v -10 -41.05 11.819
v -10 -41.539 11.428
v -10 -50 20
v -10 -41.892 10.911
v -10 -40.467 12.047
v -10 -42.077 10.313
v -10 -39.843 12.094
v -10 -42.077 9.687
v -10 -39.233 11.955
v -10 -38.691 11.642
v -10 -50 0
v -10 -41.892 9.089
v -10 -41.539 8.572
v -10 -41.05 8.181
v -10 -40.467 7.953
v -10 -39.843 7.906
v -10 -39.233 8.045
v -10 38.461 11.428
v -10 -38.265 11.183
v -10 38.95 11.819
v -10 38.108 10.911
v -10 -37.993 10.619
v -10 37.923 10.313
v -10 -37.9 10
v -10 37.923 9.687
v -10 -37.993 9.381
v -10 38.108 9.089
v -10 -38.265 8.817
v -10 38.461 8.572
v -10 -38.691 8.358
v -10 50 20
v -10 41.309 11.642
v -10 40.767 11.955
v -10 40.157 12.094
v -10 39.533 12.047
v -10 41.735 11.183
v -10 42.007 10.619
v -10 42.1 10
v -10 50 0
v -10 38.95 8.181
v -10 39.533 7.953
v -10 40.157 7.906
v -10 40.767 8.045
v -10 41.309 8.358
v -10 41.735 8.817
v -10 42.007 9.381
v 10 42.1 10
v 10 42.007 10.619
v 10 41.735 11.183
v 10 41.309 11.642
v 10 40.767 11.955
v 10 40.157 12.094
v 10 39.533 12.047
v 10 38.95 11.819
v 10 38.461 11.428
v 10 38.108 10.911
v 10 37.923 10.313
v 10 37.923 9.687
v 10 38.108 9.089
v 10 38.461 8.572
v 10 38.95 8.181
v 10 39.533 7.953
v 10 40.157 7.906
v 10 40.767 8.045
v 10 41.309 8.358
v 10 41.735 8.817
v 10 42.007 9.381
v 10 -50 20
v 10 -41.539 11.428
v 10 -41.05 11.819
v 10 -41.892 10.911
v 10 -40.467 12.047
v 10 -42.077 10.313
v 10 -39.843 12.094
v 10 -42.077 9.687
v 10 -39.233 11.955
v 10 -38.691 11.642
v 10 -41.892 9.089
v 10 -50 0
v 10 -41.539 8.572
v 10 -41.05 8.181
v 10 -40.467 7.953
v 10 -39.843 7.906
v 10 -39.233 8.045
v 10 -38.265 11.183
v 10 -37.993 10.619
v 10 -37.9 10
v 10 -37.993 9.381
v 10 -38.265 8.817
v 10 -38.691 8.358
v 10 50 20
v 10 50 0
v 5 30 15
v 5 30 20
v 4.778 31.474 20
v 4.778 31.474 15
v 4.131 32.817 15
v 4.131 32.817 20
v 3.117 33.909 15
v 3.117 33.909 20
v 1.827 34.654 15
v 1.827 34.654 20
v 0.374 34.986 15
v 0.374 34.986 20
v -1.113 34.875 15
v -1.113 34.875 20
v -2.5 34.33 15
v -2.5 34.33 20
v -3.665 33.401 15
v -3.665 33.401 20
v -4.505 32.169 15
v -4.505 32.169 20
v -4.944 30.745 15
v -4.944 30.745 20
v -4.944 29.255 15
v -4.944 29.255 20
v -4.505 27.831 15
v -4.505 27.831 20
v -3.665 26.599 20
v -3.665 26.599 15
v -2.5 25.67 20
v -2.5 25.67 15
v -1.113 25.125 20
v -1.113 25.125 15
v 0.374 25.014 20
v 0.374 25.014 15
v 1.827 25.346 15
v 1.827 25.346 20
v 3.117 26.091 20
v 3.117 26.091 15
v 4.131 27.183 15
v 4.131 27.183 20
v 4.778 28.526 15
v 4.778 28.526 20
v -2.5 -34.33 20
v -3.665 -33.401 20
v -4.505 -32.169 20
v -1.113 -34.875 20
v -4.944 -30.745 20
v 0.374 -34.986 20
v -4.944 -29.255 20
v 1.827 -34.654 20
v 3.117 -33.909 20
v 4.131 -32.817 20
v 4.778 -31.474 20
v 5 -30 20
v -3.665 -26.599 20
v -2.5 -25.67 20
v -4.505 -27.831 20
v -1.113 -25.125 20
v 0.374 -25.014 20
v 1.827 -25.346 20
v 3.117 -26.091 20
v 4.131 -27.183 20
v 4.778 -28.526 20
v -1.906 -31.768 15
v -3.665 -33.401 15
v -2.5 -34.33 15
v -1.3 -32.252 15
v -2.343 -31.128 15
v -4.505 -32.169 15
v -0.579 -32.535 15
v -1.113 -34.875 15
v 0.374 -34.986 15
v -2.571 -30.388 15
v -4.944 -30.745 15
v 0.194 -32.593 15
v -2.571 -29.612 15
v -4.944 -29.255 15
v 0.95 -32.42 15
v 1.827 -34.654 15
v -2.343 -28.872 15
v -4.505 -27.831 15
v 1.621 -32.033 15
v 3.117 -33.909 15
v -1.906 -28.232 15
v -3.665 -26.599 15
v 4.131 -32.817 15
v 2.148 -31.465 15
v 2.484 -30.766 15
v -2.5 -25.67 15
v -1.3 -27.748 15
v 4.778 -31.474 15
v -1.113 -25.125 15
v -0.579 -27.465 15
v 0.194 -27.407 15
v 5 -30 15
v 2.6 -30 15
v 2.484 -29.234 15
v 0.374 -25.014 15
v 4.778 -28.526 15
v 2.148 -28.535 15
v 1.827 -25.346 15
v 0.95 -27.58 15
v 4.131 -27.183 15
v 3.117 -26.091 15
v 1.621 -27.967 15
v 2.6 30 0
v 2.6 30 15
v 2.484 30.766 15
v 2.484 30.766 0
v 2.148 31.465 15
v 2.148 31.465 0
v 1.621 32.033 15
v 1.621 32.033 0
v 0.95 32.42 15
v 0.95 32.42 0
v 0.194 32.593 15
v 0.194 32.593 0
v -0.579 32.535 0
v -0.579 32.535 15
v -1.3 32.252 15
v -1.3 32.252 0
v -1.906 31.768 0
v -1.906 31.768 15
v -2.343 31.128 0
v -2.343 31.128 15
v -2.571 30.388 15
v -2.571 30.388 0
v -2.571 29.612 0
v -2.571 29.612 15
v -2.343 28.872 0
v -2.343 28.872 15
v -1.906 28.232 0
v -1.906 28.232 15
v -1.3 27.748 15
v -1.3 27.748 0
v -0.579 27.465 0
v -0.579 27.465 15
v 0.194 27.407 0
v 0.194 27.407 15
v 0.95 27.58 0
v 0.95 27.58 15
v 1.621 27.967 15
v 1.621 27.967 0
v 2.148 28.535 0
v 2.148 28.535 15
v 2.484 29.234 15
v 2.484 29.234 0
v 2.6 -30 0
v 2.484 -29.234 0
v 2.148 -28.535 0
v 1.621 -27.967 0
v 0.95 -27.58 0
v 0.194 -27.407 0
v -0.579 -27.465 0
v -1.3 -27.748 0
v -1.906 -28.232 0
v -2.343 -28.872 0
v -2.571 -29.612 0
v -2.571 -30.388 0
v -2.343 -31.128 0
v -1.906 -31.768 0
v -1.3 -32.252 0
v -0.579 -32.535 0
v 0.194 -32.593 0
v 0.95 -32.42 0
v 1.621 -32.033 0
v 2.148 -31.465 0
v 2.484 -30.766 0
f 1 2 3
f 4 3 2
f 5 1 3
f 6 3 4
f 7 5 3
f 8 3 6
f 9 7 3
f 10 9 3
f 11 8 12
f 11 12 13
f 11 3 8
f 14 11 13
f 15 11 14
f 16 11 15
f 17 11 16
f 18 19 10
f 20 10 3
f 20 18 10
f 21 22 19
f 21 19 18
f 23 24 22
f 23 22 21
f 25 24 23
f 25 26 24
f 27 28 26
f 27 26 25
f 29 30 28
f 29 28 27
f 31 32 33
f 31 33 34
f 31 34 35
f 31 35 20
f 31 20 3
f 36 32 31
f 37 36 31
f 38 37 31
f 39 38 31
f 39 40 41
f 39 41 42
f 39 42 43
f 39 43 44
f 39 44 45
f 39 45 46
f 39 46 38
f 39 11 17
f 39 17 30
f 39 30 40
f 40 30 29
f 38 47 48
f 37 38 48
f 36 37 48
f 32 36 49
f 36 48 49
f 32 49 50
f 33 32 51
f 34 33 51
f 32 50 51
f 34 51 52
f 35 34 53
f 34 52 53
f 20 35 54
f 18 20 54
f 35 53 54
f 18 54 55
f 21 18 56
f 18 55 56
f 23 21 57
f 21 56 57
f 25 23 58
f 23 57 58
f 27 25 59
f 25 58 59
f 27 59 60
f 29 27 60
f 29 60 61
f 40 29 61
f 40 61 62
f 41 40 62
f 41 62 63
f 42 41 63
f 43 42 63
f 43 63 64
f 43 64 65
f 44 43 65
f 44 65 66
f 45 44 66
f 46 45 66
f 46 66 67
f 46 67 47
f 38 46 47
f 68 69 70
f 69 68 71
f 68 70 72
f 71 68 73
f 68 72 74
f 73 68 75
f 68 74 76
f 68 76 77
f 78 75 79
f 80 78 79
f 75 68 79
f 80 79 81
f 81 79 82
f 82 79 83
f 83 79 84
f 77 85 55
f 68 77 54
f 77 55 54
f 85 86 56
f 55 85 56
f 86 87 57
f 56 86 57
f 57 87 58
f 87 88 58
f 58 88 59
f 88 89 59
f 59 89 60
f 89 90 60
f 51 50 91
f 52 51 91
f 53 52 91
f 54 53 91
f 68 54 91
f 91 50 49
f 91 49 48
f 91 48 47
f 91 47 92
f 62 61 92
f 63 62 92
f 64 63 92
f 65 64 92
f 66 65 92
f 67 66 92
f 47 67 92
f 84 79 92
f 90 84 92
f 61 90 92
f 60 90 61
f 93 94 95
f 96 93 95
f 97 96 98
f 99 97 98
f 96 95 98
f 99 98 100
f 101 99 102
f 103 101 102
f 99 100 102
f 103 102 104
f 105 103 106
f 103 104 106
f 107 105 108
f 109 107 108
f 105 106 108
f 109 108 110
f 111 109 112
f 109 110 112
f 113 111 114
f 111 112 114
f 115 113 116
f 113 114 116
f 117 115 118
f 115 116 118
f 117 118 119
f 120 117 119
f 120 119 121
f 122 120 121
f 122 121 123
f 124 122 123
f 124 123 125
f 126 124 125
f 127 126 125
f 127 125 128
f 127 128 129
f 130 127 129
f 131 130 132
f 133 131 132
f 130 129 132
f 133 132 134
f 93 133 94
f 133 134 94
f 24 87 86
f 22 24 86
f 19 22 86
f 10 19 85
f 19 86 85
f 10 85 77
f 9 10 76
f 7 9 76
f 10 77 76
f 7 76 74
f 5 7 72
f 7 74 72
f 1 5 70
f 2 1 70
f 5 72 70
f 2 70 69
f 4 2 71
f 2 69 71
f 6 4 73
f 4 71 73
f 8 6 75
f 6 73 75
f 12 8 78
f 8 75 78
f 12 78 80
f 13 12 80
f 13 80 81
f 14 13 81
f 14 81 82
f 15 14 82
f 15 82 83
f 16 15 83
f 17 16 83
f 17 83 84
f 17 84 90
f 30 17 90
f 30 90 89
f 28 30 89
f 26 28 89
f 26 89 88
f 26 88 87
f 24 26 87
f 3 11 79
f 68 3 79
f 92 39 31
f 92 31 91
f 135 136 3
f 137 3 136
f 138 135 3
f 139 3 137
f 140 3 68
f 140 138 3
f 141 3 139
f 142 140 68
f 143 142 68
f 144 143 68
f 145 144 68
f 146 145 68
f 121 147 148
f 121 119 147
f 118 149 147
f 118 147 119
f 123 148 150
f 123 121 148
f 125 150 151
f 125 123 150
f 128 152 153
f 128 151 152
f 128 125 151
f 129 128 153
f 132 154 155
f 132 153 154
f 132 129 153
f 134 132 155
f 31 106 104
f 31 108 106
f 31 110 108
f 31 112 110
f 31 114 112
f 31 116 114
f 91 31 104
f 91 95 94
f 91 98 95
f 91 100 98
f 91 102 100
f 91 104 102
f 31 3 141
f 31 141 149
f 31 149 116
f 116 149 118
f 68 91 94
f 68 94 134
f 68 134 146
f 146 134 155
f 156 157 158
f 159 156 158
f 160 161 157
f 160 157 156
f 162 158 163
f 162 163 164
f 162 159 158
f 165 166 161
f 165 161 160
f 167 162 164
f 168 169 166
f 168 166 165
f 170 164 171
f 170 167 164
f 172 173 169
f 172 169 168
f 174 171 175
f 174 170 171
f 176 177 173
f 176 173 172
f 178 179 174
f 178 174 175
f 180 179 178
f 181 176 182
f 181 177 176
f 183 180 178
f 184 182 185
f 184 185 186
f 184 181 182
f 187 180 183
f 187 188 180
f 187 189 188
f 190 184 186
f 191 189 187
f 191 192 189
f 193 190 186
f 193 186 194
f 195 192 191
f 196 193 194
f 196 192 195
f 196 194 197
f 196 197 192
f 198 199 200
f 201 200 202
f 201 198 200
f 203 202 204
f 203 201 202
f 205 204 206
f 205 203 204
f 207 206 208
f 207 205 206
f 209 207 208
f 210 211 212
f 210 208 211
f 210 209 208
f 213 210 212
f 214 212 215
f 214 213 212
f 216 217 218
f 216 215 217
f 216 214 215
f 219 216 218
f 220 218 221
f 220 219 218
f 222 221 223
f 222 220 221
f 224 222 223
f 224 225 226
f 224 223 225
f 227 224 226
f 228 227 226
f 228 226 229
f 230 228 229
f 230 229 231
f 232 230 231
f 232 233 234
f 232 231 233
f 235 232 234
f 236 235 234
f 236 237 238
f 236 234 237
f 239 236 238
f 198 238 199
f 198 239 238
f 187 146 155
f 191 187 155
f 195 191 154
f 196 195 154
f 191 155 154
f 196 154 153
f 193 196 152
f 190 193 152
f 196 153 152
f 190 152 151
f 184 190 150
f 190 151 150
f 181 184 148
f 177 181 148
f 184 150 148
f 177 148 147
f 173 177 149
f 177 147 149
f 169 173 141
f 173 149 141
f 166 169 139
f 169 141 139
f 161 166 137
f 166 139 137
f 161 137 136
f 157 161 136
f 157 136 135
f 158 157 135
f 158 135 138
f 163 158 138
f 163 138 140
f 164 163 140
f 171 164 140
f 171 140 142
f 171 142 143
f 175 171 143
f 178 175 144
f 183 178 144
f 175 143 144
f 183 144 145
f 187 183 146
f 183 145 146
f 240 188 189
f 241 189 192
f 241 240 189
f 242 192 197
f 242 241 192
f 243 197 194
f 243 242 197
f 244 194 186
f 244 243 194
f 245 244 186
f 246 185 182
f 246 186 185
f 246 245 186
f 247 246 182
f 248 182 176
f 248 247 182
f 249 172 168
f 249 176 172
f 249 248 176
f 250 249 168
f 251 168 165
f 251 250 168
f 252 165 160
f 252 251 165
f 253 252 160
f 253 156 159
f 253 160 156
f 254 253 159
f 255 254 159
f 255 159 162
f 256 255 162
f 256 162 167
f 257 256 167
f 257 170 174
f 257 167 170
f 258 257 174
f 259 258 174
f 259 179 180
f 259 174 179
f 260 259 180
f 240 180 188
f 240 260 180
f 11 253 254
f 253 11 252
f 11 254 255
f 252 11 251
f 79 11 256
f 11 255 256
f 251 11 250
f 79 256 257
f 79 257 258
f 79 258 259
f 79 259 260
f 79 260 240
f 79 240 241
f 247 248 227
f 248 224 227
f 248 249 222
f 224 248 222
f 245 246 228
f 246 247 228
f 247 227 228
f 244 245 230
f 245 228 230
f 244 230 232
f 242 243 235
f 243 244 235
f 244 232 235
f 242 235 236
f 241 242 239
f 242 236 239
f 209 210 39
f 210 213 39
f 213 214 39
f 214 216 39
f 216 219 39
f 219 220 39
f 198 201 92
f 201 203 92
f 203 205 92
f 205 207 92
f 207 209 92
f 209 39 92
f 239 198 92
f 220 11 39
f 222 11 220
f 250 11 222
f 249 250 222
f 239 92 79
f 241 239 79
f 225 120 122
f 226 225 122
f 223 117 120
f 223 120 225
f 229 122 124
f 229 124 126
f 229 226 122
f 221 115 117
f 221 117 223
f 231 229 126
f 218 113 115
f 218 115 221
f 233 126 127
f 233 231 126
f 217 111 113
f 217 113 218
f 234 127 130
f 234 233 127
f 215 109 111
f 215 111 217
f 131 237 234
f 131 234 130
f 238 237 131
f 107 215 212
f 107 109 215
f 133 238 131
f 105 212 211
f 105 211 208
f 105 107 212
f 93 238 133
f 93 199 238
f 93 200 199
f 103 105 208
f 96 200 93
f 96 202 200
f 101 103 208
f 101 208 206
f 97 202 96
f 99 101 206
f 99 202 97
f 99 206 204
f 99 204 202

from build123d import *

# Parameters (mm, degrees)
F0_W     = 20
F0_H     = 100
F0_R     = 2.6
F1_DEPTH = 20
F2_R     = 5
F3_DEPTH = 5
F4_R     = 2.1
F5_DEPTH = 25


with BuildPart() as f1:
    # F0 (on Top) → F1 (new body)
    with BuildSketch(Plane.XY):
        Rectangle(F0_W, F0_H)
        with Locations((0, -30)):
            Circle(F0_R, mode=Mode.SUBTRACT)
        with Locations((0, 30)):
            Circle(F0_R, mode=Mode.SUBTRACT)
    extrude(amount=F1_DEPTH)

    # F2 (on face) → F3 (cut)
    with BuildSketch(Plane.XY.offset(20)):
        with Locations((0, 30)):
            Circle(F2_R)
        with Locations((0, -30)):
            Circle(F2_R)
    extrude(amount=-F3_DEPTH, mode=Mode.SUBTRACT)

    # F4 (on face) → F5 (cut)
    with BuildSketch(Plane.YZ.offset(10)):
        with Locations((-40, 10)):
            Circle(F4_R)
        with Locations((40, 10)):
            Circle(F4_R)
    extrude(amount=-F5_DEPTH, mode=Mode.SUBTRACT)


solid = f1.part
